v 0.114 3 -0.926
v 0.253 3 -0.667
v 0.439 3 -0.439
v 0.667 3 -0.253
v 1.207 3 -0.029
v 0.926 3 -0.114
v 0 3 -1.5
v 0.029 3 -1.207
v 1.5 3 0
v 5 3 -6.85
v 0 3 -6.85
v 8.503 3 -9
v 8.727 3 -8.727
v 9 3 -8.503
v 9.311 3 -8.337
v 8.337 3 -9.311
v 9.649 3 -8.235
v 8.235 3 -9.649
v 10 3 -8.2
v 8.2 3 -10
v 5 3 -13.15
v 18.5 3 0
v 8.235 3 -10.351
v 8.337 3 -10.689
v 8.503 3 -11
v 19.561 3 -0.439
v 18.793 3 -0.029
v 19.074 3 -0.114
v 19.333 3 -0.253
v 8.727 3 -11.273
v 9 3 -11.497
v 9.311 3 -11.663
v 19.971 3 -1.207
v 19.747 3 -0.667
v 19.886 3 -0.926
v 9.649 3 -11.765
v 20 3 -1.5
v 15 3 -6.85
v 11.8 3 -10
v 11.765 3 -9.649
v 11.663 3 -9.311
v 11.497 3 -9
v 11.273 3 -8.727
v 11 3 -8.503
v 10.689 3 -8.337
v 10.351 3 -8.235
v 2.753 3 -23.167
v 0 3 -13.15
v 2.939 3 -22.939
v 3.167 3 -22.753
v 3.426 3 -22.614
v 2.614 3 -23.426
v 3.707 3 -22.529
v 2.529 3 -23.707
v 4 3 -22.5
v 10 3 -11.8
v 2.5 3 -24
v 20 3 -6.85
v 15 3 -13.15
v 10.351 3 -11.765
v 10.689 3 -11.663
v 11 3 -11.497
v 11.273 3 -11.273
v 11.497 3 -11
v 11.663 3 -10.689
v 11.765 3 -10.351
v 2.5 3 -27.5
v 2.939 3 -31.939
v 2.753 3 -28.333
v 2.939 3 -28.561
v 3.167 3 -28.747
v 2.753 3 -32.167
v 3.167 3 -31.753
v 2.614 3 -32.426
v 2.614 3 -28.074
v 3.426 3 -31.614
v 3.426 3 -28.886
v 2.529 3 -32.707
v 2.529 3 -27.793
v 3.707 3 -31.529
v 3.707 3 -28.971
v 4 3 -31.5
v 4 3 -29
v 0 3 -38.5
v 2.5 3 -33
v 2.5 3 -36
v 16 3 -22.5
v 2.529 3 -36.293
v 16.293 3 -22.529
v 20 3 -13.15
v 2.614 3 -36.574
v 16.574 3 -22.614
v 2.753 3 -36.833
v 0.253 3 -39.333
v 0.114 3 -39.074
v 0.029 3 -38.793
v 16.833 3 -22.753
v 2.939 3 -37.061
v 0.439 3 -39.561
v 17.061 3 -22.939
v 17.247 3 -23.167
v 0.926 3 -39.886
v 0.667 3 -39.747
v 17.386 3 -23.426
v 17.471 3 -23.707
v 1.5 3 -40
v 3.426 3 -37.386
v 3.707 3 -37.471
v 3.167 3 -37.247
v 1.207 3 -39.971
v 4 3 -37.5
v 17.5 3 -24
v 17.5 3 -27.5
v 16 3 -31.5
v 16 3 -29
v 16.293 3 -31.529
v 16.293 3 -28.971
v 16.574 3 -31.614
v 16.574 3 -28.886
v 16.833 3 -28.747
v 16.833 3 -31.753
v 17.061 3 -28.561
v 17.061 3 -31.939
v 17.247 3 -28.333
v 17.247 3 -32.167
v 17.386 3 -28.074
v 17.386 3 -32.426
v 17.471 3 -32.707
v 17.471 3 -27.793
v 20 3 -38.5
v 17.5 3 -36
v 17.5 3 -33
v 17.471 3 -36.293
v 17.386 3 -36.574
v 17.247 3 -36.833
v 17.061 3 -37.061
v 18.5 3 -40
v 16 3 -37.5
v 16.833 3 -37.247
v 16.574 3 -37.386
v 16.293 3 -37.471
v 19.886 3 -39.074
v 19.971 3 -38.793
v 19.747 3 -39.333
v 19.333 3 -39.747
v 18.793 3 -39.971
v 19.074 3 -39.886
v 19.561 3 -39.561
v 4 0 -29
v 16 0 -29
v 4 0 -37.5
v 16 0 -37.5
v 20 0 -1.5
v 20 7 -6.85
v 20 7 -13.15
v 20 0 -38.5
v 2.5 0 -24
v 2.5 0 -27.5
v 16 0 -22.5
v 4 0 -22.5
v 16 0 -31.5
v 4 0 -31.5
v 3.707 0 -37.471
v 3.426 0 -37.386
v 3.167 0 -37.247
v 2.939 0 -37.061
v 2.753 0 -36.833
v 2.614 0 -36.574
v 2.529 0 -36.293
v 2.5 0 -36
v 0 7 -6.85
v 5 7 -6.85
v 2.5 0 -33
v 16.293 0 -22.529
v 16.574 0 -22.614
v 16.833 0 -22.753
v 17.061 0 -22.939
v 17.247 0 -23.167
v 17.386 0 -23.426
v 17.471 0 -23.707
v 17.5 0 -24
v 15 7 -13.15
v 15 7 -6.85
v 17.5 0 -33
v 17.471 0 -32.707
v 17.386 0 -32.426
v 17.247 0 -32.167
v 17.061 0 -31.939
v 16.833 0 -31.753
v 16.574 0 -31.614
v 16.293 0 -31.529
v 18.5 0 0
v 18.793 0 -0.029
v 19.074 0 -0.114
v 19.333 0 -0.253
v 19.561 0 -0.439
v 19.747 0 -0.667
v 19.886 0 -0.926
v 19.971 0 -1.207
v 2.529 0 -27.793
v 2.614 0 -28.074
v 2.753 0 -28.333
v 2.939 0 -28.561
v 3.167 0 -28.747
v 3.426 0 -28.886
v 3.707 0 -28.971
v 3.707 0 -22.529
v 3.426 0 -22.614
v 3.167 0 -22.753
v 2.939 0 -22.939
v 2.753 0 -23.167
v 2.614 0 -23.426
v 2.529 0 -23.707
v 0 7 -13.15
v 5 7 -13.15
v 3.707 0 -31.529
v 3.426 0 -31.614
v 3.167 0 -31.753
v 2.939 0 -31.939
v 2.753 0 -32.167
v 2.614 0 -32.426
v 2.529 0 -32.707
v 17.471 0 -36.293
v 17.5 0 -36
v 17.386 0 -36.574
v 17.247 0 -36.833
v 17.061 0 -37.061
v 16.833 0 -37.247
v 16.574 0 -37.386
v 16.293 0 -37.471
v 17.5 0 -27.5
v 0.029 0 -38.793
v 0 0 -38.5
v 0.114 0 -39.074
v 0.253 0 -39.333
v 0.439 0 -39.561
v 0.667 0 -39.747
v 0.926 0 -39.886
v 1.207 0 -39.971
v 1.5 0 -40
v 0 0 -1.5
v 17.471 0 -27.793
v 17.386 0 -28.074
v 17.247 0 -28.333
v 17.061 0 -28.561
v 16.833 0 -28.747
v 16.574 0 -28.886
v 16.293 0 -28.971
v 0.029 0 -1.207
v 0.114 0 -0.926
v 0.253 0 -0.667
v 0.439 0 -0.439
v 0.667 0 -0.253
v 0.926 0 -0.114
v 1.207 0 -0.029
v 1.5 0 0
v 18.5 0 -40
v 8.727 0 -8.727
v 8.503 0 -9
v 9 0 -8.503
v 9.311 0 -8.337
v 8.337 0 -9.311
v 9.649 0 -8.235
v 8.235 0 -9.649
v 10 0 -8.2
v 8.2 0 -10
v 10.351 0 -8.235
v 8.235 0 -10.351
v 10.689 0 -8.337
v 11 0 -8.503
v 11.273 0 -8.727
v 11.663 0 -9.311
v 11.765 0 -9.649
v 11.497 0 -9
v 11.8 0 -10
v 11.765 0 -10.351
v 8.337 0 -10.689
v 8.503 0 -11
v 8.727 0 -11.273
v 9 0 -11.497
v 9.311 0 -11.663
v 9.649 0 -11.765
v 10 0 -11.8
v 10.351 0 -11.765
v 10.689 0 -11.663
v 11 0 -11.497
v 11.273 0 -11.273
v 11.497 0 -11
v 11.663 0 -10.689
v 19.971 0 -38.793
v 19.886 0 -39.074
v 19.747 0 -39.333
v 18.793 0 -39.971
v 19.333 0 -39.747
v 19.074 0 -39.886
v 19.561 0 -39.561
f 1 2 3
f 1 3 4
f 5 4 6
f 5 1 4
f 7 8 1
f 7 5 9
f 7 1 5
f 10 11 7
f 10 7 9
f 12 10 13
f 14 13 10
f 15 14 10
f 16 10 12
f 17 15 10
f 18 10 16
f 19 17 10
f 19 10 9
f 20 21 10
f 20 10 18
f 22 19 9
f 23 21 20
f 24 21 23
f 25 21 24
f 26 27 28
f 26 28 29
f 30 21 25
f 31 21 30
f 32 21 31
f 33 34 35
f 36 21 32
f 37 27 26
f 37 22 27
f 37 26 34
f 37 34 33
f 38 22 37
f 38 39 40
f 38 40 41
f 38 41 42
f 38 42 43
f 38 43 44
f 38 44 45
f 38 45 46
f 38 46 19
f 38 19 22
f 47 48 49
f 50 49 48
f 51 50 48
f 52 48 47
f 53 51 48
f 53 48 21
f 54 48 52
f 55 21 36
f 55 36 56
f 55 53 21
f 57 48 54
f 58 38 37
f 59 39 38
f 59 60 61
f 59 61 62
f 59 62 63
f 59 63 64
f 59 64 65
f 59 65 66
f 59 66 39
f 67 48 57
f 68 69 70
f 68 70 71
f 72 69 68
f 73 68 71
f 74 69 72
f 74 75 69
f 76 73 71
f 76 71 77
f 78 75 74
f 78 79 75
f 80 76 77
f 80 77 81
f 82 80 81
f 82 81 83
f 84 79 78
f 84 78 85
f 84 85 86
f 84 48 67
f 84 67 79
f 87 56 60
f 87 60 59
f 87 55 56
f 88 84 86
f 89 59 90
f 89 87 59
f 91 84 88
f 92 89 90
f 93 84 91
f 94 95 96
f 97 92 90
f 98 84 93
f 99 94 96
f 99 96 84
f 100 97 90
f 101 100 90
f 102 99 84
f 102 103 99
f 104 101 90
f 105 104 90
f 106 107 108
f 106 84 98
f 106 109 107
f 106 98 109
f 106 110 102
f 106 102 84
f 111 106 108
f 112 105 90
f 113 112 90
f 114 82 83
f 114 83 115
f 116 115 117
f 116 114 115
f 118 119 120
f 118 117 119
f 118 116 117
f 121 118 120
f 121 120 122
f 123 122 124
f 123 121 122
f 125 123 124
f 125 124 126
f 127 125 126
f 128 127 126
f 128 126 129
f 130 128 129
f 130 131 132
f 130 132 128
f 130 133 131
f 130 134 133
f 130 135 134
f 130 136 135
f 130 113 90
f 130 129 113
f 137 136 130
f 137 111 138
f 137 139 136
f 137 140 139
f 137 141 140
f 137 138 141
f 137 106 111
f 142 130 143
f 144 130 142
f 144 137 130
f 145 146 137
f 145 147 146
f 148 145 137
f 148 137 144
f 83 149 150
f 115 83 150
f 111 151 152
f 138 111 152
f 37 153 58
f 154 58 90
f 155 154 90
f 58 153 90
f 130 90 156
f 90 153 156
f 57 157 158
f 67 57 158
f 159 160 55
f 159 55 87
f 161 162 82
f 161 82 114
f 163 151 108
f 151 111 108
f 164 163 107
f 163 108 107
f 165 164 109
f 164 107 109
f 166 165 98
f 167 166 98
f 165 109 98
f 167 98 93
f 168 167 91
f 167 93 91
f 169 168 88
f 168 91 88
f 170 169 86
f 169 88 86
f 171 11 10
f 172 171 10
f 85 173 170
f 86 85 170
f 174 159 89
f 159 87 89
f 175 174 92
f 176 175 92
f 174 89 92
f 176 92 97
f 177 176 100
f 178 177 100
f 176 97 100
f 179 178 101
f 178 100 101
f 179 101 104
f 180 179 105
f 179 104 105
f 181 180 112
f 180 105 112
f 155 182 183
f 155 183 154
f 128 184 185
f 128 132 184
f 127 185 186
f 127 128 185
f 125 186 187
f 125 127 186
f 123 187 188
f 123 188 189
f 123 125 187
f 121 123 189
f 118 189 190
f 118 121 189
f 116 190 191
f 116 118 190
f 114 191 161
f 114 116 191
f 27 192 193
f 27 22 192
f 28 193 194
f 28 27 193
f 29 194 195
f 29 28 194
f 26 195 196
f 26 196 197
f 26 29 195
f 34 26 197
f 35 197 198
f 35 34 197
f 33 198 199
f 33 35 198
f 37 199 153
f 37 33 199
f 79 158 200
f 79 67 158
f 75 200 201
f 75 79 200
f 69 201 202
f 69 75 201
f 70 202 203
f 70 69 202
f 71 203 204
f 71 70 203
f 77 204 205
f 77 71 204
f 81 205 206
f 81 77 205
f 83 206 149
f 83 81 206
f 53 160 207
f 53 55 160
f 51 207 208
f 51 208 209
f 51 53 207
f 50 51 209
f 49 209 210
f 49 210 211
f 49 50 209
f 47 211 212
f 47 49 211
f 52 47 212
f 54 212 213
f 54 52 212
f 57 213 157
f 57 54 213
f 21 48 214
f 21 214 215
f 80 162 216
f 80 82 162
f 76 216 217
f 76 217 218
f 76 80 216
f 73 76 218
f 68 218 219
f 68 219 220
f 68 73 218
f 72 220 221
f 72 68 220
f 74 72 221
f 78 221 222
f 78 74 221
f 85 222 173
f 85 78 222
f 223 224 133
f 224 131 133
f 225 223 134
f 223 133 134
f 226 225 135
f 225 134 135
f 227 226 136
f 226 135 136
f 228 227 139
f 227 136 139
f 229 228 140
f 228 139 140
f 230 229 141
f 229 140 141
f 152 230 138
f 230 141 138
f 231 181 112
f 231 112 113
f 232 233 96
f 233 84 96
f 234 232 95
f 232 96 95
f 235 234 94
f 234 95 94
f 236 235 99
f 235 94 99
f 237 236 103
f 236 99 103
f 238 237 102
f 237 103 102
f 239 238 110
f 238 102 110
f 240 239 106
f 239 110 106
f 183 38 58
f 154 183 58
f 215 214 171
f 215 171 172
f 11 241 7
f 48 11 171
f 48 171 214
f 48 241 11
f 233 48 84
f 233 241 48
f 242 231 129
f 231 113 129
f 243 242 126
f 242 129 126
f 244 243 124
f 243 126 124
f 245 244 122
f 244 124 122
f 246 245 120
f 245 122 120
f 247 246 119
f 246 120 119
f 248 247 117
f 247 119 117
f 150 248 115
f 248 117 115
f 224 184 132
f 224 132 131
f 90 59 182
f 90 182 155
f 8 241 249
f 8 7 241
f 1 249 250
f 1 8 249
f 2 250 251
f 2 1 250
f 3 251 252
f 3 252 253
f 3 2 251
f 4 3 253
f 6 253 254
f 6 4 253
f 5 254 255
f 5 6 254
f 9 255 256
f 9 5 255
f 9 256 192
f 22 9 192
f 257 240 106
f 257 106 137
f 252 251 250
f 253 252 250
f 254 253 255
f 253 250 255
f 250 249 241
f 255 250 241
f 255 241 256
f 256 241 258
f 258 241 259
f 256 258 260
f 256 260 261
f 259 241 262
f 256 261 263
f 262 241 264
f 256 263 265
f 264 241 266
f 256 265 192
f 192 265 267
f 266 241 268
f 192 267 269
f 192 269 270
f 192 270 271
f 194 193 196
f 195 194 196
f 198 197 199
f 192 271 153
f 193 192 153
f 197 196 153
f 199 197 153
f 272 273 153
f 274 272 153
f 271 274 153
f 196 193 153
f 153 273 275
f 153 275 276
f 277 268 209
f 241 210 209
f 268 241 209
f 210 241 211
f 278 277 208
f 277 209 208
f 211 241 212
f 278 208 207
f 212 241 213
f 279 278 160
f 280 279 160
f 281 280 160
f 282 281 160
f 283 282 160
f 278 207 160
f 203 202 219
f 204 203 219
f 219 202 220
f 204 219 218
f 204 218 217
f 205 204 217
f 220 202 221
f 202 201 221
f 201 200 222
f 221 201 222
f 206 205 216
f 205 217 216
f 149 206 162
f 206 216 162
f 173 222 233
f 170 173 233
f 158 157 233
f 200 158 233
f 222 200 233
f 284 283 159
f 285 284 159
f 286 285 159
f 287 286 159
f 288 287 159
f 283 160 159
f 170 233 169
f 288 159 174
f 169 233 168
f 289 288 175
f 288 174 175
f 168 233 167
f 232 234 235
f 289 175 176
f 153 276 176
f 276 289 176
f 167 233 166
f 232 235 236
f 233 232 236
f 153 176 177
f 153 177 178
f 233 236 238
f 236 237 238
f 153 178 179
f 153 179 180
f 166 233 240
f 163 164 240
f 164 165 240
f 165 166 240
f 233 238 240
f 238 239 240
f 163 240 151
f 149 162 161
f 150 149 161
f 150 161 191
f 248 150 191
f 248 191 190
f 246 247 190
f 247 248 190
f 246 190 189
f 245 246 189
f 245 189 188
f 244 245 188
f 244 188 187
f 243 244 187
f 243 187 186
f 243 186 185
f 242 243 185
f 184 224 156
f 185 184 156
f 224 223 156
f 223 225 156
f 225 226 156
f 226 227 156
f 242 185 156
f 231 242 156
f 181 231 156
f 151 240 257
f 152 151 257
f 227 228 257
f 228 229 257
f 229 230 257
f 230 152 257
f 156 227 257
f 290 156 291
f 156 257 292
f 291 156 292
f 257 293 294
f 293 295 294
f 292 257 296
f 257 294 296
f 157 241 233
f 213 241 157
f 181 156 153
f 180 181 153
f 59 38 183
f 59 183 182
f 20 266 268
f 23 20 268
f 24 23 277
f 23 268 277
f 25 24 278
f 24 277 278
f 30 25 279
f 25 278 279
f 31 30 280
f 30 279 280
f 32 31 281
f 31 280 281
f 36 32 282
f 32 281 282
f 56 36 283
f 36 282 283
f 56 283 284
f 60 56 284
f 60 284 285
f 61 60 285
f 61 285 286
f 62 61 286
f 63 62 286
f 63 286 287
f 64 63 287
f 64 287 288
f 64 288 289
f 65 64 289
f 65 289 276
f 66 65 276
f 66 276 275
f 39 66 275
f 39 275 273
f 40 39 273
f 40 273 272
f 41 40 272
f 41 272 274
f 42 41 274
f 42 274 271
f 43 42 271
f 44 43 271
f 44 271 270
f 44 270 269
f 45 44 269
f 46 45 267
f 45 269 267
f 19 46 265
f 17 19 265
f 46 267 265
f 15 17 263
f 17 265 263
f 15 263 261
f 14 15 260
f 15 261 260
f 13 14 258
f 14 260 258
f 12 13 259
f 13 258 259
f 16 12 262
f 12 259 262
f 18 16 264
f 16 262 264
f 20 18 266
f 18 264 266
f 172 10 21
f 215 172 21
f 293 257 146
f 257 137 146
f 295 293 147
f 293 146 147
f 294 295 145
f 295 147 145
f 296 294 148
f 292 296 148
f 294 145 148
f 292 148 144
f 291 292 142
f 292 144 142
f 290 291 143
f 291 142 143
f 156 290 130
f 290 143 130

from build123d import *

# Parameters (mm, degrees)
SKETCH1_W                = 20
SKETCH1_H                = 40
SKETCH1_W_2              = 15
SKETCH1_H_2              = 15
SKETCH1_H_3              = 2.5
BOSS_EXTRUDE1_DEPTH      = 3
SKETCH2_W                = 5
SKETCH2_H                = 6.3
BOSS_EXTRUDE2_DEPTH      = 4
M3_CLEARANCE_HOLE1_D     = 3.6
M3_CLEARANCE_HOLE1_DEPTH = 10
M3_CLEARANCE_HOLE1_TIP   = 1.081549114
FILLET1_R                = 1.5


with BuildPart() as part:
    # Sketch1 → Boss-Extrude1 (new body)
    # profile 1 of 2: a face of its own
    with BuildSketch(Plane(origin=(0, 0, 0), x_dir=(1, 0, 0), z_dir=(0, 1, 0))):
        with Locations((10, 20)):
            Rectangle(SKETCH1_W, SKETCH1_H)
        with Locations((10, 30)):
            Rectangle(SKETCH1_W_2, SKETCH1_H_2, mode=Mode.SUBTRACT)
    # profile 2 of 2: a face of its own
    with BuildSketch(Plane(origin=(0, 0, 0), x_dir=(1, 0, 0), z_dir=(0, 1, 0))):
        with Locations((10, 30.25)):
            Rectangle(SKETCH1_W_2, SKETCH1_H_3)
    extrude(amount=BOSS_EXTRUDE1_DEPTH)

    # Sketch2 → Boss-Extrude2 (add)
    with BuildSketch(Plane(origin=(0, 3, 0), x_dir=(1, 0, 0), z_dir=(0, 1, 0))):
        with Locations((2.5, 10)):
            Rectangle(SKETCH2_W, SKETCH2_H)
        with Locations((17.5, 10)):
            Rectangle(SKETCH2_W, SKETCH2_H)
    extrude(amount=BOSS_EXTRUDE2_DEPTH)

    # M3 Clearance Hole1
    with Locations(Plane(origin=(0, 3, 0), x_dir=(1, 0, 0), z_dir=(0, 1, 0))):
        with Locations((10, 10)):
            Hole(M3_CLEARANCE_HOLE1_D / 2, depth=M3_CLEARANCE_HOLE1_DEPTH)
            with Locations((0, 0, -(M3_CLEARANCE_HOLE1_DEPTH + M3_CLEARANCE_HOLE1_TIP / 2))):  # 118° drill point
                Cone(0, M3_CLEARANCE_HOLE1_D / 2, M3_CLEARANCE_HOLE1_TIP, mode=Mode.SUBTRACT)

    # Fillet1
    fillet1_edges = [part.edges().sort_by_distance(p)[0] for p in [
        (2.5, 1.5, -37.5),
        (2.5, 1.5, -22.5),
        (17.5, 1.5, -22.5),
        (17.5, 1.5, -37.5),
        (0, 1.5, 0),
        (0, 1.5, -40),
        (20, 1.5, -40),
        (20, 1.5, 0),
        (2.5, 1.5, -31.5),
        (2.5, 1.5, -29),
        (17.5, 1.5, -31.5),
        (17.5, 1.5, -29),
    ]]
    fillet(fillet1_edges, radius=FILLET1_R)


solid = part.part
